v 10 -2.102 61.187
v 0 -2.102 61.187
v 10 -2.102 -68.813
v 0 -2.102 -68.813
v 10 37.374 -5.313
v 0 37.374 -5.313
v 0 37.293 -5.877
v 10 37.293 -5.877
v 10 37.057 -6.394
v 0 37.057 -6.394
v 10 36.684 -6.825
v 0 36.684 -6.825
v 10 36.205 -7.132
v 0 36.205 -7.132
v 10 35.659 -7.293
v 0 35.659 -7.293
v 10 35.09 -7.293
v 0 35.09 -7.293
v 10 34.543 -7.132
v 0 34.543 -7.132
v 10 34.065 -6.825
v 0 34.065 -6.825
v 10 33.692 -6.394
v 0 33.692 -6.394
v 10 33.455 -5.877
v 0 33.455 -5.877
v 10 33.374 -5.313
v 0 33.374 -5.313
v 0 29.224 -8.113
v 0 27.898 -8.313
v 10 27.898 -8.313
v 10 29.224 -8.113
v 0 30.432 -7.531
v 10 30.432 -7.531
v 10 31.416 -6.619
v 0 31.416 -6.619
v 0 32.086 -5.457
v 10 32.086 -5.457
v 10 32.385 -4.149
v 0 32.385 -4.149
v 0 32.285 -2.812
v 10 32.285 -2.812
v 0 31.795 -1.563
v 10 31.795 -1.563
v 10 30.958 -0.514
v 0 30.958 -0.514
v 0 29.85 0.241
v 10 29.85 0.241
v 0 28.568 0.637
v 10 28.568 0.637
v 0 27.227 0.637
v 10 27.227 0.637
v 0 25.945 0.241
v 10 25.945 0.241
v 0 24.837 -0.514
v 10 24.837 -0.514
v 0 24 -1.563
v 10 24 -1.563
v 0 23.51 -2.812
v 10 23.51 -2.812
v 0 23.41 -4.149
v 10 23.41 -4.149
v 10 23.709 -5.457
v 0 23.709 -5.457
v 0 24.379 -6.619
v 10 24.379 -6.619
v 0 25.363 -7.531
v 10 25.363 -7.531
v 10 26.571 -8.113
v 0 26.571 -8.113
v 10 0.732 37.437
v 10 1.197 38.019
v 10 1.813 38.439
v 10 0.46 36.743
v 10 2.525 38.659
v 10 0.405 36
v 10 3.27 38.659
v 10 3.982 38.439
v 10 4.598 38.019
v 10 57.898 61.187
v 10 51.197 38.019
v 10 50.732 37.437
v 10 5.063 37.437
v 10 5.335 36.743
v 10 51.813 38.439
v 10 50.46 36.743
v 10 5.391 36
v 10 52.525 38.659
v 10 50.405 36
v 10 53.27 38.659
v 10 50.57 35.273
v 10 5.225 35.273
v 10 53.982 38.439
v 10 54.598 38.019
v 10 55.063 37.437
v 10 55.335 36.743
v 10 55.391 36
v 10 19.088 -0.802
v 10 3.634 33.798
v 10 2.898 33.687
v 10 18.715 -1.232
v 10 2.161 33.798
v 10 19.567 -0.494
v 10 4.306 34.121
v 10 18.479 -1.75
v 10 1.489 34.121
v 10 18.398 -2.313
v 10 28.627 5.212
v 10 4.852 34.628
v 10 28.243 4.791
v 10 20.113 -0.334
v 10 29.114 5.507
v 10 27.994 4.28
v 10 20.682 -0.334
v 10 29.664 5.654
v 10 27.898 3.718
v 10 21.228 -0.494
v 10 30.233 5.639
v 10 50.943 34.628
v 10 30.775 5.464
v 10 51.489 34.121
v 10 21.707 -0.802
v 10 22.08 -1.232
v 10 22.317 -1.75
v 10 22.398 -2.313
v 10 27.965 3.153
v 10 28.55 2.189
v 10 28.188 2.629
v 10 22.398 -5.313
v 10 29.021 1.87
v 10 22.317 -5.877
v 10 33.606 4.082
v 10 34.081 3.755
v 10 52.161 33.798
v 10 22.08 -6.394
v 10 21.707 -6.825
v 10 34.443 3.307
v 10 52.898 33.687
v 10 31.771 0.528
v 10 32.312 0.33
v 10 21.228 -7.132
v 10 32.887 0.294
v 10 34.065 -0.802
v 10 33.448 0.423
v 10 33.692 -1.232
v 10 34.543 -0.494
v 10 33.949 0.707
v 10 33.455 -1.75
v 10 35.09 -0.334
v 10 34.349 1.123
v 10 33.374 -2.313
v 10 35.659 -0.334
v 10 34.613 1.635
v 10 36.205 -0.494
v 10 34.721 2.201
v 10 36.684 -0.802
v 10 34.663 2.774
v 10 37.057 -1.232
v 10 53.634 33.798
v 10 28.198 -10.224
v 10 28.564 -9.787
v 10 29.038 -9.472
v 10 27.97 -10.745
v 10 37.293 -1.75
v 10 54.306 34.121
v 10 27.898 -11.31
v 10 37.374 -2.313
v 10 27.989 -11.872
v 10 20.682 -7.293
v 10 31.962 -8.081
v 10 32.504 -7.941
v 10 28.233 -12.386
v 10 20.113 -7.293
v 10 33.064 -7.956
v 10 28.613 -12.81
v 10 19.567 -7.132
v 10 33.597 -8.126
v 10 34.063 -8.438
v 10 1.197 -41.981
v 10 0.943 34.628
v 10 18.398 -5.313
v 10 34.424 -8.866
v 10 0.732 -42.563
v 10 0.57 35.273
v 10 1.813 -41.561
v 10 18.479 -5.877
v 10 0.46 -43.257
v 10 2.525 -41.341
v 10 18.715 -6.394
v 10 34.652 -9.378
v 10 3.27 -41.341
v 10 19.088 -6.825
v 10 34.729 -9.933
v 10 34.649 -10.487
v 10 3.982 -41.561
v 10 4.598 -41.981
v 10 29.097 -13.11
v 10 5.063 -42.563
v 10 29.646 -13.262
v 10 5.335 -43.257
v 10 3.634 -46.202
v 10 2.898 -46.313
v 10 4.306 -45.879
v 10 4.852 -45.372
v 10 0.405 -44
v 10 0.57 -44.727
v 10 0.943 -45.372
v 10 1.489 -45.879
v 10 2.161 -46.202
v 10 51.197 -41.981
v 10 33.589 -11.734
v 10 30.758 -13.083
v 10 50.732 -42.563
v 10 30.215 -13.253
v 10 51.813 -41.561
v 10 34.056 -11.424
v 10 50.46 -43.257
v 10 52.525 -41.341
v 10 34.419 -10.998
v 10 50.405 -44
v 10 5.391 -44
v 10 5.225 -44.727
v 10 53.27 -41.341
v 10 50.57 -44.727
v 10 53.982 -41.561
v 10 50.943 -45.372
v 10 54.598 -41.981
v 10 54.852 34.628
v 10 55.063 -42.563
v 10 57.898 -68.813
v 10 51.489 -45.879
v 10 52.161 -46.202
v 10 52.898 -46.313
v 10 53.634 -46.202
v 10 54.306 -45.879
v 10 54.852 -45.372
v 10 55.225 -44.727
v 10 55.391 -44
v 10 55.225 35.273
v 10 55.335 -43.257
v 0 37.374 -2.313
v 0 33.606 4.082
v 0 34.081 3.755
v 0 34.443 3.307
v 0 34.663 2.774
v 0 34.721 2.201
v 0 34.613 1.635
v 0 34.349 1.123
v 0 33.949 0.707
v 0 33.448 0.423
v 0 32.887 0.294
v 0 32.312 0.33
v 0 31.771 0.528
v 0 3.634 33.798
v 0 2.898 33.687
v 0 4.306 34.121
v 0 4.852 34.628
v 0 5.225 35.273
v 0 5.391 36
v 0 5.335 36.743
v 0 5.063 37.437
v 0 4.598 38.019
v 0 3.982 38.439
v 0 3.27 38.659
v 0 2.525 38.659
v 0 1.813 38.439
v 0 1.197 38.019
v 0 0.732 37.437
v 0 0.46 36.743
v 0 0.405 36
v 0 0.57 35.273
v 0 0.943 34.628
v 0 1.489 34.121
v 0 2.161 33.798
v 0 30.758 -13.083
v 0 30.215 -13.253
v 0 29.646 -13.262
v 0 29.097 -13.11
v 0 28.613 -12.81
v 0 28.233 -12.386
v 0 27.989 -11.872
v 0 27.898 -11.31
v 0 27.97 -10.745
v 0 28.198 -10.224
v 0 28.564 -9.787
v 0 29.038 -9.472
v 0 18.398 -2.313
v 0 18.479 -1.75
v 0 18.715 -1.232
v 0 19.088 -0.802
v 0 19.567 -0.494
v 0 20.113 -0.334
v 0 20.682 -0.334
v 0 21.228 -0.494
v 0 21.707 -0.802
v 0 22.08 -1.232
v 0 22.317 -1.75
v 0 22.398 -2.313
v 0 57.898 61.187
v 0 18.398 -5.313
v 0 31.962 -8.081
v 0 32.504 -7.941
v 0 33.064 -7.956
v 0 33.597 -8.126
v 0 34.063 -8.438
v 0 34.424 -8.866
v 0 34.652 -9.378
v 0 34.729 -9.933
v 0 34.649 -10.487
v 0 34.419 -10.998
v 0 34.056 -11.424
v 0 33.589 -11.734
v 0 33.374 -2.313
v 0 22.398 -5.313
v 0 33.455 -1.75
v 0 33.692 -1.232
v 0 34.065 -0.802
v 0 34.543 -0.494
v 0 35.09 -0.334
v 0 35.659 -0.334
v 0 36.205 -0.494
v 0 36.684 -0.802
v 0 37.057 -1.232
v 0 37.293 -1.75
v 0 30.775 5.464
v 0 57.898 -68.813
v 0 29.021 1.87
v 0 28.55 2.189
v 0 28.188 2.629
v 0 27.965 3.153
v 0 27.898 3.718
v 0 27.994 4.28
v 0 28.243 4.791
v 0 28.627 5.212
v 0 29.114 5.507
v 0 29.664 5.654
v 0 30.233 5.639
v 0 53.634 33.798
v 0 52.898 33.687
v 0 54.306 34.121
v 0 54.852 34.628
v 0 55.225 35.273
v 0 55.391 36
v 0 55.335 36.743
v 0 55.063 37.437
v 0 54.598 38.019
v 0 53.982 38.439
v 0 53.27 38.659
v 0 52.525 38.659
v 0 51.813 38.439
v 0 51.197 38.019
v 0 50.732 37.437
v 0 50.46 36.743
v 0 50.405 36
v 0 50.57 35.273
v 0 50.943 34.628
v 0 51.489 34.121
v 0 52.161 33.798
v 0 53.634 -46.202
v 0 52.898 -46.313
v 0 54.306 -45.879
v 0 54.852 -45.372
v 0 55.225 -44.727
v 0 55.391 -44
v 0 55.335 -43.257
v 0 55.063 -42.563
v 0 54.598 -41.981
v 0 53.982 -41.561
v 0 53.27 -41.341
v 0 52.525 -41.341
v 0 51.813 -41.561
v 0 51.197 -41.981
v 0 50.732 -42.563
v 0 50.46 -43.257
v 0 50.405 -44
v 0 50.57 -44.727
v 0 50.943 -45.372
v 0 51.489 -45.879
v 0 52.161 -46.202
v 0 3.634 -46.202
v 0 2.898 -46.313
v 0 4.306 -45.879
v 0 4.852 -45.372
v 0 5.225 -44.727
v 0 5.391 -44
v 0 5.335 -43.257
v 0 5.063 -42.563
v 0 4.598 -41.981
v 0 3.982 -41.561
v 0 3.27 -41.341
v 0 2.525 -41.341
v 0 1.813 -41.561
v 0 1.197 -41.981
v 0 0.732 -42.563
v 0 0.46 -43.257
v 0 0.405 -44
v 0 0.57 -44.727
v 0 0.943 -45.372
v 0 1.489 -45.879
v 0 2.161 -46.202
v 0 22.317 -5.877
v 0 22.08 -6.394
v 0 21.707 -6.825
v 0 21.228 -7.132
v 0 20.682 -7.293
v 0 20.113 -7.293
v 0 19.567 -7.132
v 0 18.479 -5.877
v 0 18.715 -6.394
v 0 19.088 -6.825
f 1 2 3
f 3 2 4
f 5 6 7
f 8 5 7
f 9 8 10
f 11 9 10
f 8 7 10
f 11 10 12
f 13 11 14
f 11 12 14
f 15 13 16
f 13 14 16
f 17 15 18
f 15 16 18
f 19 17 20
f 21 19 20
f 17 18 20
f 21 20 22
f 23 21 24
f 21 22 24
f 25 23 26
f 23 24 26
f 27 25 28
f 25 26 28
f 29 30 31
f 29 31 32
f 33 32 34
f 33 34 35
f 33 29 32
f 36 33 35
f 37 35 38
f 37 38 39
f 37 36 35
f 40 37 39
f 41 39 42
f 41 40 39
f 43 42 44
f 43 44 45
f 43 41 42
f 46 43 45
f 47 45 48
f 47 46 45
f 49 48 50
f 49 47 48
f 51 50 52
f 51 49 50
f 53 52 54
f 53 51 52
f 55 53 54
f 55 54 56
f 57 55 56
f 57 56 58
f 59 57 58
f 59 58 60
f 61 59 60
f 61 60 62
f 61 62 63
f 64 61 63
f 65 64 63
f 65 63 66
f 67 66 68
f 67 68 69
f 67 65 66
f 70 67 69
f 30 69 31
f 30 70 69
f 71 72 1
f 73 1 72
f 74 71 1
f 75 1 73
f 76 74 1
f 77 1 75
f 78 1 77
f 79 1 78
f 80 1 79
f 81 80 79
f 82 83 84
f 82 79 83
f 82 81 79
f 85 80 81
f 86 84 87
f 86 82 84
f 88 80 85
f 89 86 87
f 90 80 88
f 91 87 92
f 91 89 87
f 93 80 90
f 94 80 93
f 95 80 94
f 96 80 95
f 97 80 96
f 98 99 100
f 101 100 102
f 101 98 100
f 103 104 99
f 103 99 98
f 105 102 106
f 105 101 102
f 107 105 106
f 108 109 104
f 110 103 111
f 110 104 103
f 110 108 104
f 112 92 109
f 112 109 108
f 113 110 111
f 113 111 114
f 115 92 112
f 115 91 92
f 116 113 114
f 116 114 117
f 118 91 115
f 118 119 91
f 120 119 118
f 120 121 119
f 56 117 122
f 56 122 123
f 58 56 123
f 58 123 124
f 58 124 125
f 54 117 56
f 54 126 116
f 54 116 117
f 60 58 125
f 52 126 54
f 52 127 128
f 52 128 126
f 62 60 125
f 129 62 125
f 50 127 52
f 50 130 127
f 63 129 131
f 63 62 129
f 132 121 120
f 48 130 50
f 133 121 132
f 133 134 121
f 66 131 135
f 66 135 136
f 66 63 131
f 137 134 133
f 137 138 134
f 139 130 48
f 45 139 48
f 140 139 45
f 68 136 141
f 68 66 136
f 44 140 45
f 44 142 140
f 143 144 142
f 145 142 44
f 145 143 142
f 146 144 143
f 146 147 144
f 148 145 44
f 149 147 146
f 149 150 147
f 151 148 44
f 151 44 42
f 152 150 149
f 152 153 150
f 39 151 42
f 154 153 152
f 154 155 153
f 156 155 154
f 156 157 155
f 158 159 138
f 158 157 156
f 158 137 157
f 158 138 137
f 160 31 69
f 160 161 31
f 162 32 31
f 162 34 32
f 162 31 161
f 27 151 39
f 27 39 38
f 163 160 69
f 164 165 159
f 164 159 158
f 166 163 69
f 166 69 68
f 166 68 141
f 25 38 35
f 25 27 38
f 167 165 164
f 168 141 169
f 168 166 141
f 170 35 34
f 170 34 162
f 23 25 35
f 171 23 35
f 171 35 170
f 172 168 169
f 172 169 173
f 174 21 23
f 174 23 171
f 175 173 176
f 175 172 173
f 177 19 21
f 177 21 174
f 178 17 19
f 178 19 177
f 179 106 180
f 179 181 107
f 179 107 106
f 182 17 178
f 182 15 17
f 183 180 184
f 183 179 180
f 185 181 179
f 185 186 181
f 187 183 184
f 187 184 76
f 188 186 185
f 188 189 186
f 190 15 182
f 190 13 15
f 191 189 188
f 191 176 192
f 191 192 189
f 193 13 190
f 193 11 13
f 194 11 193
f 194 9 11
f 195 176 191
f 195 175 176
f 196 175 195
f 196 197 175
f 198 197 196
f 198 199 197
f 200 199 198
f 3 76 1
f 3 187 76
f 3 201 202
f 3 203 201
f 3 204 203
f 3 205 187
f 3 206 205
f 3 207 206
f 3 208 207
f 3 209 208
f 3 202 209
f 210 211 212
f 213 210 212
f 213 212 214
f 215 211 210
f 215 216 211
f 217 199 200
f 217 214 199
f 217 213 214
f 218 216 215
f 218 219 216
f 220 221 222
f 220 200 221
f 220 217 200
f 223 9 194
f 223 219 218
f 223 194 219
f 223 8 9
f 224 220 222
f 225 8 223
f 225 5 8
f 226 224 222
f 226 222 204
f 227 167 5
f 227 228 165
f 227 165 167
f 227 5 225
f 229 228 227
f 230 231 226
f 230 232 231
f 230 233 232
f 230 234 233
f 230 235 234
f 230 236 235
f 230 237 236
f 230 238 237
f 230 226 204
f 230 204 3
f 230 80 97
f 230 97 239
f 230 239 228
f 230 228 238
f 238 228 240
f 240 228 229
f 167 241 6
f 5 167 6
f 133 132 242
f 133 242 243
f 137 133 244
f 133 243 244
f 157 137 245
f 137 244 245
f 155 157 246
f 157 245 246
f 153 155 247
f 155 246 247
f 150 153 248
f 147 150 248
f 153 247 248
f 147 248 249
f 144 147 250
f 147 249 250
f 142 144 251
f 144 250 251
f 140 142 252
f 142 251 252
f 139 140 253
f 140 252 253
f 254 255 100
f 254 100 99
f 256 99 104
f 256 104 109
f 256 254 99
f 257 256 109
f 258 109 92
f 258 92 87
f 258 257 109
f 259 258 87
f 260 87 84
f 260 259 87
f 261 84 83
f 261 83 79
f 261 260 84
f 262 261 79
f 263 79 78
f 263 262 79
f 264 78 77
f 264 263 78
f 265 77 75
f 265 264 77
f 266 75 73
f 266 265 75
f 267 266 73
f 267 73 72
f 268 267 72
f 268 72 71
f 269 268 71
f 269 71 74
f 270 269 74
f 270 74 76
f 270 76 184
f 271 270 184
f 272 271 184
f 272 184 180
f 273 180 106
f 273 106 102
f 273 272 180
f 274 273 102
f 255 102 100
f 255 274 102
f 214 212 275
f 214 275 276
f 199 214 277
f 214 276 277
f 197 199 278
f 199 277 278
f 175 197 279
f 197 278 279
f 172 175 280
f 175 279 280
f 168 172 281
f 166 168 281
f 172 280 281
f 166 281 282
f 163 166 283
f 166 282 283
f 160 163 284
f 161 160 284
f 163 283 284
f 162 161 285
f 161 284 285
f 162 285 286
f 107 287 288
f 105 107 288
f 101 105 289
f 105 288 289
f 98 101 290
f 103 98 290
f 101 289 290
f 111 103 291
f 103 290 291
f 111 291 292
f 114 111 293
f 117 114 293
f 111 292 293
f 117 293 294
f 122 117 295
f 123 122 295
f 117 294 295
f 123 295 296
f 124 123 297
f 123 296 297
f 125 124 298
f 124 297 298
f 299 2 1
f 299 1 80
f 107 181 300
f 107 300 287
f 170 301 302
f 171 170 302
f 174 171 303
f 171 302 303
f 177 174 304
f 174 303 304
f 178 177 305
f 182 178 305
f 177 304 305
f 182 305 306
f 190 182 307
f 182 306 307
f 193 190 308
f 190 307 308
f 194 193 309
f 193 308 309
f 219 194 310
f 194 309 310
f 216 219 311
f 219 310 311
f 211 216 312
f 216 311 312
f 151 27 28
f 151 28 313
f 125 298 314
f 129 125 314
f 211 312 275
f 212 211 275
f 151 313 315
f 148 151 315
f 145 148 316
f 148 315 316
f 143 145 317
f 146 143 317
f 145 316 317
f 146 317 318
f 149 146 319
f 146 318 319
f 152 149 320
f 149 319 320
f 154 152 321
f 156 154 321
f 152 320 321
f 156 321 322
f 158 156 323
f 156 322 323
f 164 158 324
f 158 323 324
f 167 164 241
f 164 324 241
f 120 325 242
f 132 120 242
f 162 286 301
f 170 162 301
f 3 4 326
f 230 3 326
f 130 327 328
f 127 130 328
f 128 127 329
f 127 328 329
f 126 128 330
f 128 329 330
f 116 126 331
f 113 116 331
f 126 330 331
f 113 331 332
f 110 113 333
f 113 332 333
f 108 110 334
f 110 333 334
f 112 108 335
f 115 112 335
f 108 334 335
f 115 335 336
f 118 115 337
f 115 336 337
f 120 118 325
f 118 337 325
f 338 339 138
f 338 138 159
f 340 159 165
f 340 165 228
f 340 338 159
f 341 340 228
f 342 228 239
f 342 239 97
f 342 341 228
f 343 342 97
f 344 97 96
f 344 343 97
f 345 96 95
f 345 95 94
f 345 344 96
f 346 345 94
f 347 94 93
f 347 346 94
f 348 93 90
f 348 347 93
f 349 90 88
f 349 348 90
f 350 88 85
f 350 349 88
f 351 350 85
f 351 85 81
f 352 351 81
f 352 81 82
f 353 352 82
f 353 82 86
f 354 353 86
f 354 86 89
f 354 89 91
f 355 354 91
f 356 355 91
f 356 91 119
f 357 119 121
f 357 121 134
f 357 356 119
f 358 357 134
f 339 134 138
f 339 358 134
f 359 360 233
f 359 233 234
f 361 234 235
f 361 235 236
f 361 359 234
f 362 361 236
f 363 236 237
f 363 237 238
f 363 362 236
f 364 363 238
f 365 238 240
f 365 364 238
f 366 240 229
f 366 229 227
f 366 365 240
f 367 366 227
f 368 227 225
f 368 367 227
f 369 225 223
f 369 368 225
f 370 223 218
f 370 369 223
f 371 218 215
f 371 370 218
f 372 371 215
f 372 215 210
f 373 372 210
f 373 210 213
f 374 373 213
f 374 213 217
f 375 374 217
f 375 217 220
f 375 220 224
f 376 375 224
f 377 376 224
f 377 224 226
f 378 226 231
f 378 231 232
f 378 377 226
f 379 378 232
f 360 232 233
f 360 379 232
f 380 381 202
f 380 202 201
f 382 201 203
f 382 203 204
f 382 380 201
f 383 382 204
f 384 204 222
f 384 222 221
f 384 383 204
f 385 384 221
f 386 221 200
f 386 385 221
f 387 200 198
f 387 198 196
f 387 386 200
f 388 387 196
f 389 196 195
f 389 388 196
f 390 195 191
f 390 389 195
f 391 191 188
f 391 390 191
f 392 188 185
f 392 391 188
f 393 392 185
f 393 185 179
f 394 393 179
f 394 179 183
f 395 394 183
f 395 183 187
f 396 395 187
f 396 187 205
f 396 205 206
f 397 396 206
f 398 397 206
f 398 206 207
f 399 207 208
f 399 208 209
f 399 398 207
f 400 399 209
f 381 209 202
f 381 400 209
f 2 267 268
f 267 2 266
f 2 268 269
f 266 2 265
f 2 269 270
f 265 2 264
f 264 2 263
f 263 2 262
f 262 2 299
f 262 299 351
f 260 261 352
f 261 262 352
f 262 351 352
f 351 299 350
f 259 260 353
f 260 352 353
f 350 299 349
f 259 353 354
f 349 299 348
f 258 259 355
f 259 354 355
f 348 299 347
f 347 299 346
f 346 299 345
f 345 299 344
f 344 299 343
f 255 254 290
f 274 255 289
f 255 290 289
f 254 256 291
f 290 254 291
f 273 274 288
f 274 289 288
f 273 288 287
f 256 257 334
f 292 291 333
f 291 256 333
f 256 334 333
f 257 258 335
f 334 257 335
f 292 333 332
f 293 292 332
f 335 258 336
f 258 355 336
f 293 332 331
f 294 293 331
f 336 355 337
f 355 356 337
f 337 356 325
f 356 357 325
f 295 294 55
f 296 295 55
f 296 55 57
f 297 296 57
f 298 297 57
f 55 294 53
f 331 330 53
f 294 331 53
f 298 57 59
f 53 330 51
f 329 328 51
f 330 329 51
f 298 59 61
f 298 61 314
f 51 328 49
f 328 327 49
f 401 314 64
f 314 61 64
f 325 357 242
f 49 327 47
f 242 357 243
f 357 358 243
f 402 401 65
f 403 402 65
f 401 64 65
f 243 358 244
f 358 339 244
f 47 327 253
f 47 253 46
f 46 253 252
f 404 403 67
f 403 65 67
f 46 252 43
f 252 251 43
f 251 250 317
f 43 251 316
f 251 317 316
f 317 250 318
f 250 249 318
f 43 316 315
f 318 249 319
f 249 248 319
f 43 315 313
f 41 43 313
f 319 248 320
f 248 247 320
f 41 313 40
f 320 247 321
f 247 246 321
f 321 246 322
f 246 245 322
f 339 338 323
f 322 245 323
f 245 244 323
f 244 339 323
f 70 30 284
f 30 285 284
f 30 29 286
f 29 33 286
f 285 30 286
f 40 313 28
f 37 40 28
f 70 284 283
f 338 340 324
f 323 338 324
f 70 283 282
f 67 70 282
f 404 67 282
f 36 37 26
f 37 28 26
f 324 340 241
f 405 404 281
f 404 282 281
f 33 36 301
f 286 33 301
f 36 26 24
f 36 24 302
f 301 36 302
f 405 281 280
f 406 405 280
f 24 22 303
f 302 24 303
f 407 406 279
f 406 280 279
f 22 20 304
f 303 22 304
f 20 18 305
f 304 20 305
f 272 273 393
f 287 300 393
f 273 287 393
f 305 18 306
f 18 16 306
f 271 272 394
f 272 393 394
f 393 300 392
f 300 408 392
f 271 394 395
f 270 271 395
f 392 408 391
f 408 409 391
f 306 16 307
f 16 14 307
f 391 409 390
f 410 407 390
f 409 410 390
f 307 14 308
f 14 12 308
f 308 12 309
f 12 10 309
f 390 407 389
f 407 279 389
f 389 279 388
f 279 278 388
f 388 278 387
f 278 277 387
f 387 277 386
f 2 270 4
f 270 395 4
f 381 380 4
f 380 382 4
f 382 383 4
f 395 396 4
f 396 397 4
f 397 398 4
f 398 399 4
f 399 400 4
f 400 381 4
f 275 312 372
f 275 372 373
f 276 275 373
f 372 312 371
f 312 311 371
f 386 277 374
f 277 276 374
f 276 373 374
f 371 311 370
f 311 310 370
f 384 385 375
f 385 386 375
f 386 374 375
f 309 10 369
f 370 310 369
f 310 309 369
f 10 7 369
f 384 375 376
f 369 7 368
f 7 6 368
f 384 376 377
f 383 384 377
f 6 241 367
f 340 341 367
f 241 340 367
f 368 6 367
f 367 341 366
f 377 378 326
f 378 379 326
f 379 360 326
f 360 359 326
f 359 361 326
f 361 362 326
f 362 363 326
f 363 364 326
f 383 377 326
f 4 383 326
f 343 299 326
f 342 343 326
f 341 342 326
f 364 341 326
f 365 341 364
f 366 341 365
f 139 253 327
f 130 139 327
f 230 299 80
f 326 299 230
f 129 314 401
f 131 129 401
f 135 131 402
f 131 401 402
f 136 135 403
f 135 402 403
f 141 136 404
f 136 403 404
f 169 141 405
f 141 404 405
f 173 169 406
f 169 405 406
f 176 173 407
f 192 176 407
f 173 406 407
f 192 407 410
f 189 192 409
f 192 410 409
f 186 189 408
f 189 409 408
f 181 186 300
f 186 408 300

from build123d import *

# Parameters (mm, degrees)
SKETCH1_W           = 130
SKETCH1_H           = 60
SKETCH1_R           = 2.5
SKETCH1_R_2         = 4.499999999
BOSS_EXTRUDE1_DEPTH = 10


with BuildPart() as part:
    # Sketch1 → Boss-Extrude1 (new body)
    with BuildSketch(Plane(origin=(0, 0, 0), x_dir=(0, 0, -1), z_dir=(1, 0, 0))):
        with Locations((3.813160791, 27.897530874)):
            Rectangle(SKETCH1_W, SKETCH1_H)
        with Locations((-36.186839209, 52.897530874)):
            Circle(SKETCH1_R, mode=Mode.SUBTRACT)
        with Locations((-36.186839209, 2.897530874)):
            Circle(SKETCH1_R, mode=Mode.SUBTRACT)
        with Locations((43.813160791, 2.897530874)):
            Circle(SKETCH1_R, mode=Mode.SUBTRACT)
        with Locations((43.813160791, 52.897530874)):
            Circle(SKETCH1_R, mode=Mode.SUBTRACT)
        with Locations((3.813160791, 27.897530874)):
            Circle(SKETCH1_R_2, mode=Mode.SUBTRACT)
        with BuildLine():
            Line((-5.464379102, 30.775341326), (-4.081605515, 33.606305024))
            ThreePointArc((-4.081605515, 33.606305024), (-1.369183898, 34.499769949), (-0.528409533, 31.770555947))
            Line((-0.528409533, 31.770555947), (-1.869576404, 29.020756356))
            ThreePointArc((-1.869576404, 29.020756356), (-4.544523089, 28.10012945), (-5.464379102, 30.775341326))
        make_face(mode=Mode.SUBTRACT)
        with BuildLine():
            Line((5.31316079, 18.397530874), (2.313160791, 18.397530874))
            ThreePointArc((2.313160791, 18.397530874), (0.313160792, 20.397530874), (2.313160791, 22.397530873))
            Line((2.313160791, 22.397530873), (5.31316079, 22.397530873))
            ThreePointArc((5.31316079, 22.397530873), (7.313160789, 20.397530874), (5.31316079, 18.397530874))
        make_face(mode=Mode.SUBTRACT)
        with BuildLine():
            Line((5.31316079, 33.374248764), (2.313160791, 33.374248764))
            ThreePointArc((2.313160791, 33.374248764), (0.31316079, 35.374248765), (2.313160791, 37.374248765))
            Line((2.313160791, 37.374248765), (5.31316079, 37.374248765))
            ThreePointArc((5.31316079, 37.374248765), (7.313160791, 35.374248765), (5.31316079, 33.374248764))
        make_face(mode=Mode.SUBTRACT)
        with BuildLine():
            Line((9.471997672, 29.038205562), (8.081045524, 31.961596177))
            ThreePointArc((8.081045524, 31.961596177), (9.113942414, 34.555839775), (11.733632625, 33.589300054))
            Line((11.733632625, 33.589300054), (13.083423708, 30.758314735))
            ThreePointArc((13.083423708, 30.758314735), (12.137765277, 28.092547131), (9.471997672, 29.038205562))
        make_face(mode=Mode.SUBTRACT)
    extrude(amount=BOSS_EXTRUDE1_DEPTH)


solid = part.part
